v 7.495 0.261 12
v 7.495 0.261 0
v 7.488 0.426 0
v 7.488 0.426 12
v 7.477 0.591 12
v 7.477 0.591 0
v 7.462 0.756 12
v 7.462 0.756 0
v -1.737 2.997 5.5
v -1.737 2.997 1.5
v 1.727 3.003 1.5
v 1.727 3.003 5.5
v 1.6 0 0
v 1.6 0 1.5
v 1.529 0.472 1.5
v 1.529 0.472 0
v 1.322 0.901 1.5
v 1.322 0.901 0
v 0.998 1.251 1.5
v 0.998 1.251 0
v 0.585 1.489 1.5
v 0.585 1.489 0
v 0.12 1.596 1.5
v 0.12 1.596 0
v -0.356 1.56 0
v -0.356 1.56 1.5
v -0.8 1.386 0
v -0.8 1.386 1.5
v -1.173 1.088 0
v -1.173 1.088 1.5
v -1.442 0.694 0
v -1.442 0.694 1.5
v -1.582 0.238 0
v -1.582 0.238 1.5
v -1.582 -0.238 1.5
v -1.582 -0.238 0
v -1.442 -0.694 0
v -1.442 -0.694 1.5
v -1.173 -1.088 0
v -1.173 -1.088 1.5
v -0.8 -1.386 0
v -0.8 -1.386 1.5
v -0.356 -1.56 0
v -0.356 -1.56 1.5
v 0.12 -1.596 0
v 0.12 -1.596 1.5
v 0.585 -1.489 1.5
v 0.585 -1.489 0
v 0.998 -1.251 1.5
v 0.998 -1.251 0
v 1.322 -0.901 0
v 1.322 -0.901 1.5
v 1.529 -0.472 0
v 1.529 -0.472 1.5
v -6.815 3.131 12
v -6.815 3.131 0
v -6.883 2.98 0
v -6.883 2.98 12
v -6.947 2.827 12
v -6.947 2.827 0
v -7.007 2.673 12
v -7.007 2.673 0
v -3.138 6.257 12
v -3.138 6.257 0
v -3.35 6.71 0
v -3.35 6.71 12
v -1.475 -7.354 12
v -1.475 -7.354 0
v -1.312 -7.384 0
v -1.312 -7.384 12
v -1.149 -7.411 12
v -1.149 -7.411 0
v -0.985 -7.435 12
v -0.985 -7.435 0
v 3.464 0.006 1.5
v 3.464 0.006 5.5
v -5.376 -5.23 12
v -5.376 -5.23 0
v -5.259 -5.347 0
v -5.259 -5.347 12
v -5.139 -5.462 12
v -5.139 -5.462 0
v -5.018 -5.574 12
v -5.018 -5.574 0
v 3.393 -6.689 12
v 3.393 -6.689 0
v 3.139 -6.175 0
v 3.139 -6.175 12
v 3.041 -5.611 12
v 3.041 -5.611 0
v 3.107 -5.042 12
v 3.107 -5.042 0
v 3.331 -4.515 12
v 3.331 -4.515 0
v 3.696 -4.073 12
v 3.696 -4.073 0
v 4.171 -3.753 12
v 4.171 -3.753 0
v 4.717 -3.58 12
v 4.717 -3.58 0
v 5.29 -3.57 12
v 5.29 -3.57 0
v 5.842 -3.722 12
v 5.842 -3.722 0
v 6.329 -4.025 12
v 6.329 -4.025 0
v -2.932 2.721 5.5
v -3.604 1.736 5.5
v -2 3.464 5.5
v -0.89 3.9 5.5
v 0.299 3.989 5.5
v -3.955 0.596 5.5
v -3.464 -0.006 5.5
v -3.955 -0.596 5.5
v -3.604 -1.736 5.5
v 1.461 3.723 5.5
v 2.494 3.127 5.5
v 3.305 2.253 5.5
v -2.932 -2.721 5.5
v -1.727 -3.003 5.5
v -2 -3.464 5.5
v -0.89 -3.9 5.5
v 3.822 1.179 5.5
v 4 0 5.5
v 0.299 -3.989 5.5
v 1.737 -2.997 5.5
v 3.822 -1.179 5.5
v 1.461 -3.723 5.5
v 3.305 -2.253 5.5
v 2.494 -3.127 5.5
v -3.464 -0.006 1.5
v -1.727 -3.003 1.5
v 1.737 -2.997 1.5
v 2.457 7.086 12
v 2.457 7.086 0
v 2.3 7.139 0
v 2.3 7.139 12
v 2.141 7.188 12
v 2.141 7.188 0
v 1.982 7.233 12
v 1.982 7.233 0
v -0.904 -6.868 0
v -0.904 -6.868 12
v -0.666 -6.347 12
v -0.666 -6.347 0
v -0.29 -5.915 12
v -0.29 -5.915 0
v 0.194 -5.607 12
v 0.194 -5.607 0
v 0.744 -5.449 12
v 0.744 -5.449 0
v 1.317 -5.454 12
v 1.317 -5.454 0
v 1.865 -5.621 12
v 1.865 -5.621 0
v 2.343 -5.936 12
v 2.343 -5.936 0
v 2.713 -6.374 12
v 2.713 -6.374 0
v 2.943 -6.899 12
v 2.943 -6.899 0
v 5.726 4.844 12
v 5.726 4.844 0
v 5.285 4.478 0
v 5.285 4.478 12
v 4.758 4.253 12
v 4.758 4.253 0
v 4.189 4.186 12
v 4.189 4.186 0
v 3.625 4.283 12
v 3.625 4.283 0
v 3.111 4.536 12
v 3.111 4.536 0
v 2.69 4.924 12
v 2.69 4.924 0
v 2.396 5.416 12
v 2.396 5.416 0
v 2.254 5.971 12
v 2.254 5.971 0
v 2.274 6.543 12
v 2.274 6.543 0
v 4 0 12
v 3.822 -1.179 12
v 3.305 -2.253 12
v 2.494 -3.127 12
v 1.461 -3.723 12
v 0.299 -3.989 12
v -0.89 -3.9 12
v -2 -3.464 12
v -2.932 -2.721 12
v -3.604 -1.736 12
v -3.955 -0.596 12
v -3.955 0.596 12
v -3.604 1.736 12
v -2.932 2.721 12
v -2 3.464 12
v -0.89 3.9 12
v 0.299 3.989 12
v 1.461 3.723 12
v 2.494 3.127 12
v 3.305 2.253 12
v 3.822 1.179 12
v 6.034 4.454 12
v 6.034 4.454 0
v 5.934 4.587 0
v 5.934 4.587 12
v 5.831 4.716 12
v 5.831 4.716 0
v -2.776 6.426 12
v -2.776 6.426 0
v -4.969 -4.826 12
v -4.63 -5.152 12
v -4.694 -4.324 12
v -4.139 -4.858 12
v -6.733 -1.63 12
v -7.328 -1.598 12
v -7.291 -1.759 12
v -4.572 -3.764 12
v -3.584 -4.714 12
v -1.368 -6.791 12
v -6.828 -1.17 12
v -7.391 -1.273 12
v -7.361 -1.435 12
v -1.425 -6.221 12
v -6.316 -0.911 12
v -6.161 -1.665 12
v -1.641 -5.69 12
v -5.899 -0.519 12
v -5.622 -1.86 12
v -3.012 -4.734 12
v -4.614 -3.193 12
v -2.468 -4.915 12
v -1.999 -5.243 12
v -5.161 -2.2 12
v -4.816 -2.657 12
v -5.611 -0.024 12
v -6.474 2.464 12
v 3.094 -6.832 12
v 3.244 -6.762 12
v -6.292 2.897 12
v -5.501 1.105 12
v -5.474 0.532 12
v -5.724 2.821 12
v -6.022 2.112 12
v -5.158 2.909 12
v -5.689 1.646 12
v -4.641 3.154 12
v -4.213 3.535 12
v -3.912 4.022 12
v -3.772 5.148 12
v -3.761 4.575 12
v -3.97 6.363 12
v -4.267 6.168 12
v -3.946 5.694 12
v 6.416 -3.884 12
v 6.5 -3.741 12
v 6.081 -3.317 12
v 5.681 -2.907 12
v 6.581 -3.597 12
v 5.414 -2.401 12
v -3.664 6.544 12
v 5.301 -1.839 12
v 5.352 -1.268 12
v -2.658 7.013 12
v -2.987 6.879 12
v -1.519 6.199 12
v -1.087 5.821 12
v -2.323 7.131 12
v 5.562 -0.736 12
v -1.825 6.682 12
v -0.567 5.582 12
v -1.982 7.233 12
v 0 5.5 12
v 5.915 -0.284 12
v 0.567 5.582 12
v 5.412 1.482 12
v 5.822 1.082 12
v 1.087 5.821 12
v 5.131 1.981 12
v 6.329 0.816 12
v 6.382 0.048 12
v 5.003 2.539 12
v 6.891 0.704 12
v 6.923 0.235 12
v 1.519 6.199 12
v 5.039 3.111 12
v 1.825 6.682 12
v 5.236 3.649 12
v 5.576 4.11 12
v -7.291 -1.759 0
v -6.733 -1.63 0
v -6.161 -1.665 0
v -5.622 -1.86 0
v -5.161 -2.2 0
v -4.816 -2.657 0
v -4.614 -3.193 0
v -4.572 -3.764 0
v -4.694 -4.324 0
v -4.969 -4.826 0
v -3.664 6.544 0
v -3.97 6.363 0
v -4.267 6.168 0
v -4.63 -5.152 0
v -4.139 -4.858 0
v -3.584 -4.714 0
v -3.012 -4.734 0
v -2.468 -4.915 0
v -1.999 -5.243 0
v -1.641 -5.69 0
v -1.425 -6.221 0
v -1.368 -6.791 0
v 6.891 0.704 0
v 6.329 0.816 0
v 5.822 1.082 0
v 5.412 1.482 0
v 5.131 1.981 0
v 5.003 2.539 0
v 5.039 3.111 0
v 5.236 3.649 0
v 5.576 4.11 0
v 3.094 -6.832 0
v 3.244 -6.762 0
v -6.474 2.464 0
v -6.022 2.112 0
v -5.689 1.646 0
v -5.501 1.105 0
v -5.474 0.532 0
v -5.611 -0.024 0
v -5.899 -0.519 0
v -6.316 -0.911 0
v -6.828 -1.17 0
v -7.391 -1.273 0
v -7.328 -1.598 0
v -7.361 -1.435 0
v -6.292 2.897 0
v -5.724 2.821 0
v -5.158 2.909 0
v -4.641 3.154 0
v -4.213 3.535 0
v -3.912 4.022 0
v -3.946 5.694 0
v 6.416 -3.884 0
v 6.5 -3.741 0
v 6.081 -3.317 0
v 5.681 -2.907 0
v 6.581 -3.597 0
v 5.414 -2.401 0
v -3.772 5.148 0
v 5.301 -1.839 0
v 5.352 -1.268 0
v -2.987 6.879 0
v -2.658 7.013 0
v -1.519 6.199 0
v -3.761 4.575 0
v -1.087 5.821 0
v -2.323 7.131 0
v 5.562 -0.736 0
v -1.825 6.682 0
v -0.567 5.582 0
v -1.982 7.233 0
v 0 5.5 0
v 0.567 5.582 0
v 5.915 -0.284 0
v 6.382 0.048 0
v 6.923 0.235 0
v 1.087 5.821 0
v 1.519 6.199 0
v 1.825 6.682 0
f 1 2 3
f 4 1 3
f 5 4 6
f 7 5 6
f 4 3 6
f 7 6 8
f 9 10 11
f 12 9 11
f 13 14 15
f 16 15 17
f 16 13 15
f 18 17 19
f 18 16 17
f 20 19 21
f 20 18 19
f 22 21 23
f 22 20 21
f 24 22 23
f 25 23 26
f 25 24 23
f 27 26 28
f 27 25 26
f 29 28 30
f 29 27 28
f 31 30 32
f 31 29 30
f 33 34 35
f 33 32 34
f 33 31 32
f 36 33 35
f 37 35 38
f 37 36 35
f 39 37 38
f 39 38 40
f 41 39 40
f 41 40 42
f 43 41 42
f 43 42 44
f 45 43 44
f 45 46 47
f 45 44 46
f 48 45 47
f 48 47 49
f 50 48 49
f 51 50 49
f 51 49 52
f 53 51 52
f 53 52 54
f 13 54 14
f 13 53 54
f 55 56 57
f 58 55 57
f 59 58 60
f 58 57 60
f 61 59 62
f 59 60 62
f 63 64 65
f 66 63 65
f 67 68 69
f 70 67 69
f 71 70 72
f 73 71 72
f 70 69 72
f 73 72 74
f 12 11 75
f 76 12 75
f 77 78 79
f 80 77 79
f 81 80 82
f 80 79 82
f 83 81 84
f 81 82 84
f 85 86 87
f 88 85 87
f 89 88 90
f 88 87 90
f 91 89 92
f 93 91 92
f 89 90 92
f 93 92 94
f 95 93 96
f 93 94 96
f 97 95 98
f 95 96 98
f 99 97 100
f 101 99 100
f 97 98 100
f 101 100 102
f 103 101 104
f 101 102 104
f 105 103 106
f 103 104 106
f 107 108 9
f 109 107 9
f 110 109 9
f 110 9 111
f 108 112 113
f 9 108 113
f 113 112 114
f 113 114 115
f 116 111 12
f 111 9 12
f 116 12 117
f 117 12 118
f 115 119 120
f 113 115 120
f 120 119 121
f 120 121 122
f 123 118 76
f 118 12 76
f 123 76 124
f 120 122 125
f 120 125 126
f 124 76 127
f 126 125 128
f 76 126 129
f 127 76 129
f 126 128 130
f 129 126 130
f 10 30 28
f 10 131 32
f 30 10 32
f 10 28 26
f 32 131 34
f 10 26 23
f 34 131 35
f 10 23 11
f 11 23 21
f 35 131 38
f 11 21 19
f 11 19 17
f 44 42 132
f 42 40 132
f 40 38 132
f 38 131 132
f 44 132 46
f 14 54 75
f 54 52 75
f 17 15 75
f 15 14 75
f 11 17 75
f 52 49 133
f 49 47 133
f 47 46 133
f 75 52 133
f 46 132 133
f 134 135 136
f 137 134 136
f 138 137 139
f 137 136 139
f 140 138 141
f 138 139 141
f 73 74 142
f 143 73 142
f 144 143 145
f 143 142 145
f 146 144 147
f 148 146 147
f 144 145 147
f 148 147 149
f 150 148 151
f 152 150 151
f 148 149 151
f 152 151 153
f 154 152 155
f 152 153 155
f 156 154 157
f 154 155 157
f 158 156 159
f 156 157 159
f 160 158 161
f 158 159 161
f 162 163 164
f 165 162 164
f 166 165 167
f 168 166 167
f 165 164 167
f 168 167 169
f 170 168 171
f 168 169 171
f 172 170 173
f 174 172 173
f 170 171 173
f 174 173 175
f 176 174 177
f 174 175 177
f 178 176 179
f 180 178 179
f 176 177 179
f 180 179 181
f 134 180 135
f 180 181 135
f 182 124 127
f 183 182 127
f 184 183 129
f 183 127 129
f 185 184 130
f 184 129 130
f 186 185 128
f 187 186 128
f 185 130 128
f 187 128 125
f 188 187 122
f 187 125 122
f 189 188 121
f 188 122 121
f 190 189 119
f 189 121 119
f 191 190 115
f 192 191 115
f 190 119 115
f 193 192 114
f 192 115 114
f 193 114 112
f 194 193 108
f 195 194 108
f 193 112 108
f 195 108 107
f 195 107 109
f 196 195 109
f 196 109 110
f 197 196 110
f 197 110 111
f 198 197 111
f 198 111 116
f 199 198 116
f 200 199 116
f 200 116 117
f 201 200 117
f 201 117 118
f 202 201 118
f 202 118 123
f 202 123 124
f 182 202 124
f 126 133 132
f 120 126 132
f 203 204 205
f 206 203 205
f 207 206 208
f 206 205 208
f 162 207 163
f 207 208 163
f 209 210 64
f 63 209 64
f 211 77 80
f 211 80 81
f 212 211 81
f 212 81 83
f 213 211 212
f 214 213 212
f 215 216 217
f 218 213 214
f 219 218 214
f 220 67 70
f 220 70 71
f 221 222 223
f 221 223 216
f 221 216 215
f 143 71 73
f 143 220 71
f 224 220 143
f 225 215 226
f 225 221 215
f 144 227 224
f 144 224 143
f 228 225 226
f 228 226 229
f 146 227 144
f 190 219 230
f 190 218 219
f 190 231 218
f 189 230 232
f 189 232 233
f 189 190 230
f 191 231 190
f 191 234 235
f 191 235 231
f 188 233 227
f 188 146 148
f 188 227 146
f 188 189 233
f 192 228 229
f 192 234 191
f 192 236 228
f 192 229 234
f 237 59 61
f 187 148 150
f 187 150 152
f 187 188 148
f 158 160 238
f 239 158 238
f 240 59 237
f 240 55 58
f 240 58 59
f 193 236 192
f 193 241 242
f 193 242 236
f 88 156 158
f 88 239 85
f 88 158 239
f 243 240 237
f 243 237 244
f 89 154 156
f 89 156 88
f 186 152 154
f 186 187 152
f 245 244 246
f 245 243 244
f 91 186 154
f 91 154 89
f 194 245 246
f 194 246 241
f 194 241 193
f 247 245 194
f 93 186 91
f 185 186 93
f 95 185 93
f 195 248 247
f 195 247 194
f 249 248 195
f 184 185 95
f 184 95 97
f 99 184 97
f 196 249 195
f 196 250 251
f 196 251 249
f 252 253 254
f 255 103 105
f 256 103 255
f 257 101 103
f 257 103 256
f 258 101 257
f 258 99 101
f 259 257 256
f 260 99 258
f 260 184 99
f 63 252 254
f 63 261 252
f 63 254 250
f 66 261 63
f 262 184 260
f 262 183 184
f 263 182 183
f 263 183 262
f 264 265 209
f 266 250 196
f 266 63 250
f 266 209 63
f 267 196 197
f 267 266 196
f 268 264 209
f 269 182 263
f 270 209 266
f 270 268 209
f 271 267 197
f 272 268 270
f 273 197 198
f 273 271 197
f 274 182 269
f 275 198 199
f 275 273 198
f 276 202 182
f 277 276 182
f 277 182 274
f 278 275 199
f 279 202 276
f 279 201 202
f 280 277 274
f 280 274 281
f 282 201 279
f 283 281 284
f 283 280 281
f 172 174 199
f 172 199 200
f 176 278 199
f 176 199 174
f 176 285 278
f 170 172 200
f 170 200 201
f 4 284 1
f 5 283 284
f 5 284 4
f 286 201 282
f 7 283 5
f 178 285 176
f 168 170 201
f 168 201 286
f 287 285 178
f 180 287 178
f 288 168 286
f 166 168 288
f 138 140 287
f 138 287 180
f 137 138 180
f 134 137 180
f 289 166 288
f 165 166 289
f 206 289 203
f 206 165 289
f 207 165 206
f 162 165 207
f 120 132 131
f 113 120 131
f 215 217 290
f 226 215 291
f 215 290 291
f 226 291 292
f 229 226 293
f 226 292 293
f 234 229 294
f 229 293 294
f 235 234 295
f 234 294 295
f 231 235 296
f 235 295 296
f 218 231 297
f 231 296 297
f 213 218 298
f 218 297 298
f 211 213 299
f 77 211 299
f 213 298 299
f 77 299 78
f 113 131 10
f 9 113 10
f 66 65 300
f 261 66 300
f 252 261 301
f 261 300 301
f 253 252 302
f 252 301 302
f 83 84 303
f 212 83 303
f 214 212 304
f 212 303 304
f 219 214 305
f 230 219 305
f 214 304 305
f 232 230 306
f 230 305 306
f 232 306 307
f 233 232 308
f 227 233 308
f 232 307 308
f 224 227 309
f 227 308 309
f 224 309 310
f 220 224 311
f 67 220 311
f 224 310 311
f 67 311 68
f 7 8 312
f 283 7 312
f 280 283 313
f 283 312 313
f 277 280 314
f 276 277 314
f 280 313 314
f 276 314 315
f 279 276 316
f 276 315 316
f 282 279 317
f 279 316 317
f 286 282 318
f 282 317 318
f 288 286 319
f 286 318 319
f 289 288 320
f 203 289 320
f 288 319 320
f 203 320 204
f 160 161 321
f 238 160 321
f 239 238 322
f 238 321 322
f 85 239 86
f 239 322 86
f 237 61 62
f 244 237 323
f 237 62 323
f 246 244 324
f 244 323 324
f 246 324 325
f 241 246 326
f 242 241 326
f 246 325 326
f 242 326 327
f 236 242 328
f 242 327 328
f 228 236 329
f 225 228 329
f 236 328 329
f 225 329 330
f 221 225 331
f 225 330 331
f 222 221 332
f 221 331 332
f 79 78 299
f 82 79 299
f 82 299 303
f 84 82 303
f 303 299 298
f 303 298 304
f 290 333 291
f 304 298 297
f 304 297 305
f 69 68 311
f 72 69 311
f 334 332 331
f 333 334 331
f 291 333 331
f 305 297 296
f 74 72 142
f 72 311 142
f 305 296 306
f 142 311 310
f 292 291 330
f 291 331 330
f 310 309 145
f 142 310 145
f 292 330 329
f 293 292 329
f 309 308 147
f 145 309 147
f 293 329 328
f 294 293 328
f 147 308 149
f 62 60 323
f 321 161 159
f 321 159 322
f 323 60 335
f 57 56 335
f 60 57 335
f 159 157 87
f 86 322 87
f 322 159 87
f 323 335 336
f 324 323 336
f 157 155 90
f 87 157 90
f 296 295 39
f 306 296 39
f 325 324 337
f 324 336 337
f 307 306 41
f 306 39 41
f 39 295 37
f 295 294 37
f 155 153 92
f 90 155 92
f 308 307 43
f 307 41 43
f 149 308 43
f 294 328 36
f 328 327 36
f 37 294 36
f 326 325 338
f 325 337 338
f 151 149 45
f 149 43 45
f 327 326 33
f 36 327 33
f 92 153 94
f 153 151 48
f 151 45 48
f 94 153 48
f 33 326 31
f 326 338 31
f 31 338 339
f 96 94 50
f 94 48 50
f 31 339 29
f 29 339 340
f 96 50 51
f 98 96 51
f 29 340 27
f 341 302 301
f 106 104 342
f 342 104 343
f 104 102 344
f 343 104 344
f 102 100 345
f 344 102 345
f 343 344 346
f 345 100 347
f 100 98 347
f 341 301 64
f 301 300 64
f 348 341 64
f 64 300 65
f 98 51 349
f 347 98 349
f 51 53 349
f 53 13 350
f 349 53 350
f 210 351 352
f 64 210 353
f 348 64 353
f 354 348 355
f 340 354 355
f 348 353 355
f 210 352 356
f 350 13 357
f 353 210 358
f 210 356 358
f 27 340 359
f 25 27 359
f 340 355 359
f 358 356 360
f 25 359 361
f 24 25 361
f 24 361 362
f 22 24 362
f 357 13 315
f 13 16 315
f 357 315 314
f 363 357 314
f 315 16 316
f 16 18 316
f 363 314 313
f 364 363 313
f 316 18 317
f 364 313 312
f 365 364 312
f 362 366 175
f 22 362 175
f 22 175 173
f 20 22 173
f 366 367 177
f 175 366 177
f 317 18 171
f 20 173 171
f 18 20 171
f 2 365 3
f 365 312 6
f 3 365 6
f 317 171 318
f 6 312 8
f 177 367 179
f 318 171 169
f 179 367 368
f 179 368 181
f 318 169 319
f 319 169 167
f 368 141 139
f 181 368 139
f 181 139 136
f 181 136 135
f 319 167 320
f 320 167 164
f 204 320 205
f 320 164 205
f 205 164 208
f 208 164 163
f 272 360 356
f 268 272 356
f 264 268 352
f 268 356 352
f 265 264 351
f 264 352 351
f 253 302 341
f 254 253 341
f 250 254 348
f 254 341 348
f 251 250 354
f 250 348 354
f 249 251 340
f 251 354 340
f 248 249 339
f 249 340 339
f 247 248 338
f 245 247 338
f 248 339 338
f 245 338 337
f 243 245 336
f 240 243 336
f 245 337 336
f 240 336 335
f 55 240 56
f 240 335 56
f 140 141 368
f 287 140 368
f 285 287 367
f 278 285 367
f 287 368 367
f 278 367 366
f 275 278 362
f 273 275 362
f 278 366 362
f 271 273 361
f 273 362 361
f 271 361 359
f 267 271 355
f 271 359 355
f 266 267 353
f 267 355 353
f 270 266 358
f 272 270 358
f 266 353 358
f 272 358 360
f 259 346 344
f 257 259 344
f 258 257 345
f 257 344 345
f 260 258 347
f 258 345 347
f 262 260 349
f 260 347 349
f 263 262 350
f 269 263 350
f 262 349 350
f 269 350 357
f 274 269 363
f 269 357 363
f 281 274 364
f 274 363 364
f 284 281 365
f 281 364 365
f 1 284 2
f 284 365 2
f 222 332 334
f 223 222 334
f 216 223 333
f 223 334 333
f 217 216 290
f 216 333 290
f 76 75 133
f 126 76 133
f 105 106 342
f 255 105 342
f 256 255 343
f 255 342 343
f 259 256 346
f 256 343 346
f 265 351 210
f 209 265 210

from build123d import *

# Parameters (mm, degrees)
F0_R     = 1.6
F1_DEPTH = 12
F5_DEPTH = 4
F6_R     = 4
F7_DEPTH = 25


with BuildPart() as f1:
    # F0 (on Top) → F1 (new body)
    with BuildSketch(Plane.XY):
        with BuildLine():
            ThreePointArc((6.5812443787, -3.5968350571), (5.3517467882, -1.2683872891), (7.4954714157, 0.260592127))
            ThreePointArc((7.4954714157, 0.260592127), (7.4827308748, 0.5086635974), (7.4617823733, 0.7561771044))
            ThreePointArc((7.4617823733, 0.7561771044), (5.130860376, 1.9809774864), (6.0339352218, 4.4543939811))
            ThreePointArc((6.0339352218, 4.4543939811), (5.8831174869, 4.6517661845), (5.7258464401, 4.8440357704))
            ThreePointArc((5.7258464401, 4.8440357704), (3.1108378152, 4.5357125226), (2.456599692, 7.0862626224))
            ThreePointArc((2.456599692, 7.0862626224), (2.2205890006, 7.1637269972), (1.9821424996, 7.2333333333))
            ThreePointArc((1.9821424996, 7.2333333333), (0, 5.5), (-1.9821424996, 7.2333333333))
            ThreePointArc((-1.9821424996, 7.2333333333), (-2.490988884, 7.0742472659), (-2.9872482232, 6.8794148045))
            Line((-2.9872482232, 6.8794148045), (-2.7759390923, 6.426260911))
            Line((-2.7759390923, 6.426260911), (-3.1384622071, 6.2572136063))
            Line((-3.1384622071, 6.2572136063), (-3.349771338, 6.7103674999))
            ThreePointArc((-3.349771338, 6.7103674999), (-3.8180110168, 6.4554466829), (-4.2669581658, 6.1679062907))
            ThreePointArc((-4.2669581658, 6.1679062907), (-4.2132444372, 3.5353318533), (-6.8151514446, 3.1310877961))
            ThreePointArc((-6.8151514446, 3.1310877961), (-6.915100354, 2.9036850887), (-7.0074639483, 2.6730972696))
            ThreePointArc((-7.0074639483, 2.6730972696), (-5.4741653769, 0.5324597889), (-7.3912498308, -1.2725666735))
            ThreePointArc((-7.3912498308, -1.2725666735), (-7.3450546632, -1.5166317925), (-7.2908025549, -1.7590332871))
            ThreePointArc((-7.2908025549, -1.7590332871), (-4.8155702722, -2.6571192961), (-5.3756065246, -5.2299956494))
            ThreePointArc((-5.3756065246, -5.2299956494), (-5.1994656152, -5.4051417481), (-5.0176213056, -5.5743588361))
            ThreePointArc((-5.0176213056, -5.5743588361), (-2.4683954911, -4.9149795218), (-1.4750068347, -7.3535266939))
            ThreePointArc((-1.4750068347, -7.3535266939), (-1.2306839919, -7.3983387941), (-0.9850111866, -7.4350355051))
            ThreePointArc((-0.9850111866, -7.4350355051), (0.7443221486, -5.4494022185), (2.9428039897, -6.8985436636))
            ThreePointArc((2.9428039897, -6.8985436636), (3.1696369631, -6.7973084028), (3.3929930968, -6.6886170353))
            ThreePointArc((3.3929930968, -6.6886170353), (3.6960432331, -4.0729920721), (6.3287206193, -4.0245863543))
            ThreePointArc((6.3287206193, -4.0245863543), (6.4585247429, -3.8128018759), (6.5812443787, -3.5968350571))
        make_face()
        Circle(F0_R, mode=Mode.SUBTRACT)
    extrude(amount=F1_DEPTH)

    # F4 (on offset) → F5 (cut)
    with BuildSketch(Plane(origin=(0, 0, 1.5), x_dir=(1, 0, 0), z_dir=(0, 0, -1))):
        Polygon((3.4640966662, -0.0058555579), (1.737119395, 2.9970679351), (-1.7269772711, 3.002923493), (-3.4640966662, 0.0058555579), (-1.737119395, -2.9970679351), (1.7269772711, -3.002923493), align=None)
    extrude(amount=-F5_DEPTH, mode=Mode.SUBTRACT)

    # F6 (on offset) → F7 (cut)
    with BuildSketch(Plane(origin=(0, 0, 5.5), x_dir=(1, 0, 0), z_dir=(0, 0, -1))):
        Circle(F6_R)
    extrude(amount=-F7_DEPTH, mode=Mode.SUBTRACT)


solid = f1.part
